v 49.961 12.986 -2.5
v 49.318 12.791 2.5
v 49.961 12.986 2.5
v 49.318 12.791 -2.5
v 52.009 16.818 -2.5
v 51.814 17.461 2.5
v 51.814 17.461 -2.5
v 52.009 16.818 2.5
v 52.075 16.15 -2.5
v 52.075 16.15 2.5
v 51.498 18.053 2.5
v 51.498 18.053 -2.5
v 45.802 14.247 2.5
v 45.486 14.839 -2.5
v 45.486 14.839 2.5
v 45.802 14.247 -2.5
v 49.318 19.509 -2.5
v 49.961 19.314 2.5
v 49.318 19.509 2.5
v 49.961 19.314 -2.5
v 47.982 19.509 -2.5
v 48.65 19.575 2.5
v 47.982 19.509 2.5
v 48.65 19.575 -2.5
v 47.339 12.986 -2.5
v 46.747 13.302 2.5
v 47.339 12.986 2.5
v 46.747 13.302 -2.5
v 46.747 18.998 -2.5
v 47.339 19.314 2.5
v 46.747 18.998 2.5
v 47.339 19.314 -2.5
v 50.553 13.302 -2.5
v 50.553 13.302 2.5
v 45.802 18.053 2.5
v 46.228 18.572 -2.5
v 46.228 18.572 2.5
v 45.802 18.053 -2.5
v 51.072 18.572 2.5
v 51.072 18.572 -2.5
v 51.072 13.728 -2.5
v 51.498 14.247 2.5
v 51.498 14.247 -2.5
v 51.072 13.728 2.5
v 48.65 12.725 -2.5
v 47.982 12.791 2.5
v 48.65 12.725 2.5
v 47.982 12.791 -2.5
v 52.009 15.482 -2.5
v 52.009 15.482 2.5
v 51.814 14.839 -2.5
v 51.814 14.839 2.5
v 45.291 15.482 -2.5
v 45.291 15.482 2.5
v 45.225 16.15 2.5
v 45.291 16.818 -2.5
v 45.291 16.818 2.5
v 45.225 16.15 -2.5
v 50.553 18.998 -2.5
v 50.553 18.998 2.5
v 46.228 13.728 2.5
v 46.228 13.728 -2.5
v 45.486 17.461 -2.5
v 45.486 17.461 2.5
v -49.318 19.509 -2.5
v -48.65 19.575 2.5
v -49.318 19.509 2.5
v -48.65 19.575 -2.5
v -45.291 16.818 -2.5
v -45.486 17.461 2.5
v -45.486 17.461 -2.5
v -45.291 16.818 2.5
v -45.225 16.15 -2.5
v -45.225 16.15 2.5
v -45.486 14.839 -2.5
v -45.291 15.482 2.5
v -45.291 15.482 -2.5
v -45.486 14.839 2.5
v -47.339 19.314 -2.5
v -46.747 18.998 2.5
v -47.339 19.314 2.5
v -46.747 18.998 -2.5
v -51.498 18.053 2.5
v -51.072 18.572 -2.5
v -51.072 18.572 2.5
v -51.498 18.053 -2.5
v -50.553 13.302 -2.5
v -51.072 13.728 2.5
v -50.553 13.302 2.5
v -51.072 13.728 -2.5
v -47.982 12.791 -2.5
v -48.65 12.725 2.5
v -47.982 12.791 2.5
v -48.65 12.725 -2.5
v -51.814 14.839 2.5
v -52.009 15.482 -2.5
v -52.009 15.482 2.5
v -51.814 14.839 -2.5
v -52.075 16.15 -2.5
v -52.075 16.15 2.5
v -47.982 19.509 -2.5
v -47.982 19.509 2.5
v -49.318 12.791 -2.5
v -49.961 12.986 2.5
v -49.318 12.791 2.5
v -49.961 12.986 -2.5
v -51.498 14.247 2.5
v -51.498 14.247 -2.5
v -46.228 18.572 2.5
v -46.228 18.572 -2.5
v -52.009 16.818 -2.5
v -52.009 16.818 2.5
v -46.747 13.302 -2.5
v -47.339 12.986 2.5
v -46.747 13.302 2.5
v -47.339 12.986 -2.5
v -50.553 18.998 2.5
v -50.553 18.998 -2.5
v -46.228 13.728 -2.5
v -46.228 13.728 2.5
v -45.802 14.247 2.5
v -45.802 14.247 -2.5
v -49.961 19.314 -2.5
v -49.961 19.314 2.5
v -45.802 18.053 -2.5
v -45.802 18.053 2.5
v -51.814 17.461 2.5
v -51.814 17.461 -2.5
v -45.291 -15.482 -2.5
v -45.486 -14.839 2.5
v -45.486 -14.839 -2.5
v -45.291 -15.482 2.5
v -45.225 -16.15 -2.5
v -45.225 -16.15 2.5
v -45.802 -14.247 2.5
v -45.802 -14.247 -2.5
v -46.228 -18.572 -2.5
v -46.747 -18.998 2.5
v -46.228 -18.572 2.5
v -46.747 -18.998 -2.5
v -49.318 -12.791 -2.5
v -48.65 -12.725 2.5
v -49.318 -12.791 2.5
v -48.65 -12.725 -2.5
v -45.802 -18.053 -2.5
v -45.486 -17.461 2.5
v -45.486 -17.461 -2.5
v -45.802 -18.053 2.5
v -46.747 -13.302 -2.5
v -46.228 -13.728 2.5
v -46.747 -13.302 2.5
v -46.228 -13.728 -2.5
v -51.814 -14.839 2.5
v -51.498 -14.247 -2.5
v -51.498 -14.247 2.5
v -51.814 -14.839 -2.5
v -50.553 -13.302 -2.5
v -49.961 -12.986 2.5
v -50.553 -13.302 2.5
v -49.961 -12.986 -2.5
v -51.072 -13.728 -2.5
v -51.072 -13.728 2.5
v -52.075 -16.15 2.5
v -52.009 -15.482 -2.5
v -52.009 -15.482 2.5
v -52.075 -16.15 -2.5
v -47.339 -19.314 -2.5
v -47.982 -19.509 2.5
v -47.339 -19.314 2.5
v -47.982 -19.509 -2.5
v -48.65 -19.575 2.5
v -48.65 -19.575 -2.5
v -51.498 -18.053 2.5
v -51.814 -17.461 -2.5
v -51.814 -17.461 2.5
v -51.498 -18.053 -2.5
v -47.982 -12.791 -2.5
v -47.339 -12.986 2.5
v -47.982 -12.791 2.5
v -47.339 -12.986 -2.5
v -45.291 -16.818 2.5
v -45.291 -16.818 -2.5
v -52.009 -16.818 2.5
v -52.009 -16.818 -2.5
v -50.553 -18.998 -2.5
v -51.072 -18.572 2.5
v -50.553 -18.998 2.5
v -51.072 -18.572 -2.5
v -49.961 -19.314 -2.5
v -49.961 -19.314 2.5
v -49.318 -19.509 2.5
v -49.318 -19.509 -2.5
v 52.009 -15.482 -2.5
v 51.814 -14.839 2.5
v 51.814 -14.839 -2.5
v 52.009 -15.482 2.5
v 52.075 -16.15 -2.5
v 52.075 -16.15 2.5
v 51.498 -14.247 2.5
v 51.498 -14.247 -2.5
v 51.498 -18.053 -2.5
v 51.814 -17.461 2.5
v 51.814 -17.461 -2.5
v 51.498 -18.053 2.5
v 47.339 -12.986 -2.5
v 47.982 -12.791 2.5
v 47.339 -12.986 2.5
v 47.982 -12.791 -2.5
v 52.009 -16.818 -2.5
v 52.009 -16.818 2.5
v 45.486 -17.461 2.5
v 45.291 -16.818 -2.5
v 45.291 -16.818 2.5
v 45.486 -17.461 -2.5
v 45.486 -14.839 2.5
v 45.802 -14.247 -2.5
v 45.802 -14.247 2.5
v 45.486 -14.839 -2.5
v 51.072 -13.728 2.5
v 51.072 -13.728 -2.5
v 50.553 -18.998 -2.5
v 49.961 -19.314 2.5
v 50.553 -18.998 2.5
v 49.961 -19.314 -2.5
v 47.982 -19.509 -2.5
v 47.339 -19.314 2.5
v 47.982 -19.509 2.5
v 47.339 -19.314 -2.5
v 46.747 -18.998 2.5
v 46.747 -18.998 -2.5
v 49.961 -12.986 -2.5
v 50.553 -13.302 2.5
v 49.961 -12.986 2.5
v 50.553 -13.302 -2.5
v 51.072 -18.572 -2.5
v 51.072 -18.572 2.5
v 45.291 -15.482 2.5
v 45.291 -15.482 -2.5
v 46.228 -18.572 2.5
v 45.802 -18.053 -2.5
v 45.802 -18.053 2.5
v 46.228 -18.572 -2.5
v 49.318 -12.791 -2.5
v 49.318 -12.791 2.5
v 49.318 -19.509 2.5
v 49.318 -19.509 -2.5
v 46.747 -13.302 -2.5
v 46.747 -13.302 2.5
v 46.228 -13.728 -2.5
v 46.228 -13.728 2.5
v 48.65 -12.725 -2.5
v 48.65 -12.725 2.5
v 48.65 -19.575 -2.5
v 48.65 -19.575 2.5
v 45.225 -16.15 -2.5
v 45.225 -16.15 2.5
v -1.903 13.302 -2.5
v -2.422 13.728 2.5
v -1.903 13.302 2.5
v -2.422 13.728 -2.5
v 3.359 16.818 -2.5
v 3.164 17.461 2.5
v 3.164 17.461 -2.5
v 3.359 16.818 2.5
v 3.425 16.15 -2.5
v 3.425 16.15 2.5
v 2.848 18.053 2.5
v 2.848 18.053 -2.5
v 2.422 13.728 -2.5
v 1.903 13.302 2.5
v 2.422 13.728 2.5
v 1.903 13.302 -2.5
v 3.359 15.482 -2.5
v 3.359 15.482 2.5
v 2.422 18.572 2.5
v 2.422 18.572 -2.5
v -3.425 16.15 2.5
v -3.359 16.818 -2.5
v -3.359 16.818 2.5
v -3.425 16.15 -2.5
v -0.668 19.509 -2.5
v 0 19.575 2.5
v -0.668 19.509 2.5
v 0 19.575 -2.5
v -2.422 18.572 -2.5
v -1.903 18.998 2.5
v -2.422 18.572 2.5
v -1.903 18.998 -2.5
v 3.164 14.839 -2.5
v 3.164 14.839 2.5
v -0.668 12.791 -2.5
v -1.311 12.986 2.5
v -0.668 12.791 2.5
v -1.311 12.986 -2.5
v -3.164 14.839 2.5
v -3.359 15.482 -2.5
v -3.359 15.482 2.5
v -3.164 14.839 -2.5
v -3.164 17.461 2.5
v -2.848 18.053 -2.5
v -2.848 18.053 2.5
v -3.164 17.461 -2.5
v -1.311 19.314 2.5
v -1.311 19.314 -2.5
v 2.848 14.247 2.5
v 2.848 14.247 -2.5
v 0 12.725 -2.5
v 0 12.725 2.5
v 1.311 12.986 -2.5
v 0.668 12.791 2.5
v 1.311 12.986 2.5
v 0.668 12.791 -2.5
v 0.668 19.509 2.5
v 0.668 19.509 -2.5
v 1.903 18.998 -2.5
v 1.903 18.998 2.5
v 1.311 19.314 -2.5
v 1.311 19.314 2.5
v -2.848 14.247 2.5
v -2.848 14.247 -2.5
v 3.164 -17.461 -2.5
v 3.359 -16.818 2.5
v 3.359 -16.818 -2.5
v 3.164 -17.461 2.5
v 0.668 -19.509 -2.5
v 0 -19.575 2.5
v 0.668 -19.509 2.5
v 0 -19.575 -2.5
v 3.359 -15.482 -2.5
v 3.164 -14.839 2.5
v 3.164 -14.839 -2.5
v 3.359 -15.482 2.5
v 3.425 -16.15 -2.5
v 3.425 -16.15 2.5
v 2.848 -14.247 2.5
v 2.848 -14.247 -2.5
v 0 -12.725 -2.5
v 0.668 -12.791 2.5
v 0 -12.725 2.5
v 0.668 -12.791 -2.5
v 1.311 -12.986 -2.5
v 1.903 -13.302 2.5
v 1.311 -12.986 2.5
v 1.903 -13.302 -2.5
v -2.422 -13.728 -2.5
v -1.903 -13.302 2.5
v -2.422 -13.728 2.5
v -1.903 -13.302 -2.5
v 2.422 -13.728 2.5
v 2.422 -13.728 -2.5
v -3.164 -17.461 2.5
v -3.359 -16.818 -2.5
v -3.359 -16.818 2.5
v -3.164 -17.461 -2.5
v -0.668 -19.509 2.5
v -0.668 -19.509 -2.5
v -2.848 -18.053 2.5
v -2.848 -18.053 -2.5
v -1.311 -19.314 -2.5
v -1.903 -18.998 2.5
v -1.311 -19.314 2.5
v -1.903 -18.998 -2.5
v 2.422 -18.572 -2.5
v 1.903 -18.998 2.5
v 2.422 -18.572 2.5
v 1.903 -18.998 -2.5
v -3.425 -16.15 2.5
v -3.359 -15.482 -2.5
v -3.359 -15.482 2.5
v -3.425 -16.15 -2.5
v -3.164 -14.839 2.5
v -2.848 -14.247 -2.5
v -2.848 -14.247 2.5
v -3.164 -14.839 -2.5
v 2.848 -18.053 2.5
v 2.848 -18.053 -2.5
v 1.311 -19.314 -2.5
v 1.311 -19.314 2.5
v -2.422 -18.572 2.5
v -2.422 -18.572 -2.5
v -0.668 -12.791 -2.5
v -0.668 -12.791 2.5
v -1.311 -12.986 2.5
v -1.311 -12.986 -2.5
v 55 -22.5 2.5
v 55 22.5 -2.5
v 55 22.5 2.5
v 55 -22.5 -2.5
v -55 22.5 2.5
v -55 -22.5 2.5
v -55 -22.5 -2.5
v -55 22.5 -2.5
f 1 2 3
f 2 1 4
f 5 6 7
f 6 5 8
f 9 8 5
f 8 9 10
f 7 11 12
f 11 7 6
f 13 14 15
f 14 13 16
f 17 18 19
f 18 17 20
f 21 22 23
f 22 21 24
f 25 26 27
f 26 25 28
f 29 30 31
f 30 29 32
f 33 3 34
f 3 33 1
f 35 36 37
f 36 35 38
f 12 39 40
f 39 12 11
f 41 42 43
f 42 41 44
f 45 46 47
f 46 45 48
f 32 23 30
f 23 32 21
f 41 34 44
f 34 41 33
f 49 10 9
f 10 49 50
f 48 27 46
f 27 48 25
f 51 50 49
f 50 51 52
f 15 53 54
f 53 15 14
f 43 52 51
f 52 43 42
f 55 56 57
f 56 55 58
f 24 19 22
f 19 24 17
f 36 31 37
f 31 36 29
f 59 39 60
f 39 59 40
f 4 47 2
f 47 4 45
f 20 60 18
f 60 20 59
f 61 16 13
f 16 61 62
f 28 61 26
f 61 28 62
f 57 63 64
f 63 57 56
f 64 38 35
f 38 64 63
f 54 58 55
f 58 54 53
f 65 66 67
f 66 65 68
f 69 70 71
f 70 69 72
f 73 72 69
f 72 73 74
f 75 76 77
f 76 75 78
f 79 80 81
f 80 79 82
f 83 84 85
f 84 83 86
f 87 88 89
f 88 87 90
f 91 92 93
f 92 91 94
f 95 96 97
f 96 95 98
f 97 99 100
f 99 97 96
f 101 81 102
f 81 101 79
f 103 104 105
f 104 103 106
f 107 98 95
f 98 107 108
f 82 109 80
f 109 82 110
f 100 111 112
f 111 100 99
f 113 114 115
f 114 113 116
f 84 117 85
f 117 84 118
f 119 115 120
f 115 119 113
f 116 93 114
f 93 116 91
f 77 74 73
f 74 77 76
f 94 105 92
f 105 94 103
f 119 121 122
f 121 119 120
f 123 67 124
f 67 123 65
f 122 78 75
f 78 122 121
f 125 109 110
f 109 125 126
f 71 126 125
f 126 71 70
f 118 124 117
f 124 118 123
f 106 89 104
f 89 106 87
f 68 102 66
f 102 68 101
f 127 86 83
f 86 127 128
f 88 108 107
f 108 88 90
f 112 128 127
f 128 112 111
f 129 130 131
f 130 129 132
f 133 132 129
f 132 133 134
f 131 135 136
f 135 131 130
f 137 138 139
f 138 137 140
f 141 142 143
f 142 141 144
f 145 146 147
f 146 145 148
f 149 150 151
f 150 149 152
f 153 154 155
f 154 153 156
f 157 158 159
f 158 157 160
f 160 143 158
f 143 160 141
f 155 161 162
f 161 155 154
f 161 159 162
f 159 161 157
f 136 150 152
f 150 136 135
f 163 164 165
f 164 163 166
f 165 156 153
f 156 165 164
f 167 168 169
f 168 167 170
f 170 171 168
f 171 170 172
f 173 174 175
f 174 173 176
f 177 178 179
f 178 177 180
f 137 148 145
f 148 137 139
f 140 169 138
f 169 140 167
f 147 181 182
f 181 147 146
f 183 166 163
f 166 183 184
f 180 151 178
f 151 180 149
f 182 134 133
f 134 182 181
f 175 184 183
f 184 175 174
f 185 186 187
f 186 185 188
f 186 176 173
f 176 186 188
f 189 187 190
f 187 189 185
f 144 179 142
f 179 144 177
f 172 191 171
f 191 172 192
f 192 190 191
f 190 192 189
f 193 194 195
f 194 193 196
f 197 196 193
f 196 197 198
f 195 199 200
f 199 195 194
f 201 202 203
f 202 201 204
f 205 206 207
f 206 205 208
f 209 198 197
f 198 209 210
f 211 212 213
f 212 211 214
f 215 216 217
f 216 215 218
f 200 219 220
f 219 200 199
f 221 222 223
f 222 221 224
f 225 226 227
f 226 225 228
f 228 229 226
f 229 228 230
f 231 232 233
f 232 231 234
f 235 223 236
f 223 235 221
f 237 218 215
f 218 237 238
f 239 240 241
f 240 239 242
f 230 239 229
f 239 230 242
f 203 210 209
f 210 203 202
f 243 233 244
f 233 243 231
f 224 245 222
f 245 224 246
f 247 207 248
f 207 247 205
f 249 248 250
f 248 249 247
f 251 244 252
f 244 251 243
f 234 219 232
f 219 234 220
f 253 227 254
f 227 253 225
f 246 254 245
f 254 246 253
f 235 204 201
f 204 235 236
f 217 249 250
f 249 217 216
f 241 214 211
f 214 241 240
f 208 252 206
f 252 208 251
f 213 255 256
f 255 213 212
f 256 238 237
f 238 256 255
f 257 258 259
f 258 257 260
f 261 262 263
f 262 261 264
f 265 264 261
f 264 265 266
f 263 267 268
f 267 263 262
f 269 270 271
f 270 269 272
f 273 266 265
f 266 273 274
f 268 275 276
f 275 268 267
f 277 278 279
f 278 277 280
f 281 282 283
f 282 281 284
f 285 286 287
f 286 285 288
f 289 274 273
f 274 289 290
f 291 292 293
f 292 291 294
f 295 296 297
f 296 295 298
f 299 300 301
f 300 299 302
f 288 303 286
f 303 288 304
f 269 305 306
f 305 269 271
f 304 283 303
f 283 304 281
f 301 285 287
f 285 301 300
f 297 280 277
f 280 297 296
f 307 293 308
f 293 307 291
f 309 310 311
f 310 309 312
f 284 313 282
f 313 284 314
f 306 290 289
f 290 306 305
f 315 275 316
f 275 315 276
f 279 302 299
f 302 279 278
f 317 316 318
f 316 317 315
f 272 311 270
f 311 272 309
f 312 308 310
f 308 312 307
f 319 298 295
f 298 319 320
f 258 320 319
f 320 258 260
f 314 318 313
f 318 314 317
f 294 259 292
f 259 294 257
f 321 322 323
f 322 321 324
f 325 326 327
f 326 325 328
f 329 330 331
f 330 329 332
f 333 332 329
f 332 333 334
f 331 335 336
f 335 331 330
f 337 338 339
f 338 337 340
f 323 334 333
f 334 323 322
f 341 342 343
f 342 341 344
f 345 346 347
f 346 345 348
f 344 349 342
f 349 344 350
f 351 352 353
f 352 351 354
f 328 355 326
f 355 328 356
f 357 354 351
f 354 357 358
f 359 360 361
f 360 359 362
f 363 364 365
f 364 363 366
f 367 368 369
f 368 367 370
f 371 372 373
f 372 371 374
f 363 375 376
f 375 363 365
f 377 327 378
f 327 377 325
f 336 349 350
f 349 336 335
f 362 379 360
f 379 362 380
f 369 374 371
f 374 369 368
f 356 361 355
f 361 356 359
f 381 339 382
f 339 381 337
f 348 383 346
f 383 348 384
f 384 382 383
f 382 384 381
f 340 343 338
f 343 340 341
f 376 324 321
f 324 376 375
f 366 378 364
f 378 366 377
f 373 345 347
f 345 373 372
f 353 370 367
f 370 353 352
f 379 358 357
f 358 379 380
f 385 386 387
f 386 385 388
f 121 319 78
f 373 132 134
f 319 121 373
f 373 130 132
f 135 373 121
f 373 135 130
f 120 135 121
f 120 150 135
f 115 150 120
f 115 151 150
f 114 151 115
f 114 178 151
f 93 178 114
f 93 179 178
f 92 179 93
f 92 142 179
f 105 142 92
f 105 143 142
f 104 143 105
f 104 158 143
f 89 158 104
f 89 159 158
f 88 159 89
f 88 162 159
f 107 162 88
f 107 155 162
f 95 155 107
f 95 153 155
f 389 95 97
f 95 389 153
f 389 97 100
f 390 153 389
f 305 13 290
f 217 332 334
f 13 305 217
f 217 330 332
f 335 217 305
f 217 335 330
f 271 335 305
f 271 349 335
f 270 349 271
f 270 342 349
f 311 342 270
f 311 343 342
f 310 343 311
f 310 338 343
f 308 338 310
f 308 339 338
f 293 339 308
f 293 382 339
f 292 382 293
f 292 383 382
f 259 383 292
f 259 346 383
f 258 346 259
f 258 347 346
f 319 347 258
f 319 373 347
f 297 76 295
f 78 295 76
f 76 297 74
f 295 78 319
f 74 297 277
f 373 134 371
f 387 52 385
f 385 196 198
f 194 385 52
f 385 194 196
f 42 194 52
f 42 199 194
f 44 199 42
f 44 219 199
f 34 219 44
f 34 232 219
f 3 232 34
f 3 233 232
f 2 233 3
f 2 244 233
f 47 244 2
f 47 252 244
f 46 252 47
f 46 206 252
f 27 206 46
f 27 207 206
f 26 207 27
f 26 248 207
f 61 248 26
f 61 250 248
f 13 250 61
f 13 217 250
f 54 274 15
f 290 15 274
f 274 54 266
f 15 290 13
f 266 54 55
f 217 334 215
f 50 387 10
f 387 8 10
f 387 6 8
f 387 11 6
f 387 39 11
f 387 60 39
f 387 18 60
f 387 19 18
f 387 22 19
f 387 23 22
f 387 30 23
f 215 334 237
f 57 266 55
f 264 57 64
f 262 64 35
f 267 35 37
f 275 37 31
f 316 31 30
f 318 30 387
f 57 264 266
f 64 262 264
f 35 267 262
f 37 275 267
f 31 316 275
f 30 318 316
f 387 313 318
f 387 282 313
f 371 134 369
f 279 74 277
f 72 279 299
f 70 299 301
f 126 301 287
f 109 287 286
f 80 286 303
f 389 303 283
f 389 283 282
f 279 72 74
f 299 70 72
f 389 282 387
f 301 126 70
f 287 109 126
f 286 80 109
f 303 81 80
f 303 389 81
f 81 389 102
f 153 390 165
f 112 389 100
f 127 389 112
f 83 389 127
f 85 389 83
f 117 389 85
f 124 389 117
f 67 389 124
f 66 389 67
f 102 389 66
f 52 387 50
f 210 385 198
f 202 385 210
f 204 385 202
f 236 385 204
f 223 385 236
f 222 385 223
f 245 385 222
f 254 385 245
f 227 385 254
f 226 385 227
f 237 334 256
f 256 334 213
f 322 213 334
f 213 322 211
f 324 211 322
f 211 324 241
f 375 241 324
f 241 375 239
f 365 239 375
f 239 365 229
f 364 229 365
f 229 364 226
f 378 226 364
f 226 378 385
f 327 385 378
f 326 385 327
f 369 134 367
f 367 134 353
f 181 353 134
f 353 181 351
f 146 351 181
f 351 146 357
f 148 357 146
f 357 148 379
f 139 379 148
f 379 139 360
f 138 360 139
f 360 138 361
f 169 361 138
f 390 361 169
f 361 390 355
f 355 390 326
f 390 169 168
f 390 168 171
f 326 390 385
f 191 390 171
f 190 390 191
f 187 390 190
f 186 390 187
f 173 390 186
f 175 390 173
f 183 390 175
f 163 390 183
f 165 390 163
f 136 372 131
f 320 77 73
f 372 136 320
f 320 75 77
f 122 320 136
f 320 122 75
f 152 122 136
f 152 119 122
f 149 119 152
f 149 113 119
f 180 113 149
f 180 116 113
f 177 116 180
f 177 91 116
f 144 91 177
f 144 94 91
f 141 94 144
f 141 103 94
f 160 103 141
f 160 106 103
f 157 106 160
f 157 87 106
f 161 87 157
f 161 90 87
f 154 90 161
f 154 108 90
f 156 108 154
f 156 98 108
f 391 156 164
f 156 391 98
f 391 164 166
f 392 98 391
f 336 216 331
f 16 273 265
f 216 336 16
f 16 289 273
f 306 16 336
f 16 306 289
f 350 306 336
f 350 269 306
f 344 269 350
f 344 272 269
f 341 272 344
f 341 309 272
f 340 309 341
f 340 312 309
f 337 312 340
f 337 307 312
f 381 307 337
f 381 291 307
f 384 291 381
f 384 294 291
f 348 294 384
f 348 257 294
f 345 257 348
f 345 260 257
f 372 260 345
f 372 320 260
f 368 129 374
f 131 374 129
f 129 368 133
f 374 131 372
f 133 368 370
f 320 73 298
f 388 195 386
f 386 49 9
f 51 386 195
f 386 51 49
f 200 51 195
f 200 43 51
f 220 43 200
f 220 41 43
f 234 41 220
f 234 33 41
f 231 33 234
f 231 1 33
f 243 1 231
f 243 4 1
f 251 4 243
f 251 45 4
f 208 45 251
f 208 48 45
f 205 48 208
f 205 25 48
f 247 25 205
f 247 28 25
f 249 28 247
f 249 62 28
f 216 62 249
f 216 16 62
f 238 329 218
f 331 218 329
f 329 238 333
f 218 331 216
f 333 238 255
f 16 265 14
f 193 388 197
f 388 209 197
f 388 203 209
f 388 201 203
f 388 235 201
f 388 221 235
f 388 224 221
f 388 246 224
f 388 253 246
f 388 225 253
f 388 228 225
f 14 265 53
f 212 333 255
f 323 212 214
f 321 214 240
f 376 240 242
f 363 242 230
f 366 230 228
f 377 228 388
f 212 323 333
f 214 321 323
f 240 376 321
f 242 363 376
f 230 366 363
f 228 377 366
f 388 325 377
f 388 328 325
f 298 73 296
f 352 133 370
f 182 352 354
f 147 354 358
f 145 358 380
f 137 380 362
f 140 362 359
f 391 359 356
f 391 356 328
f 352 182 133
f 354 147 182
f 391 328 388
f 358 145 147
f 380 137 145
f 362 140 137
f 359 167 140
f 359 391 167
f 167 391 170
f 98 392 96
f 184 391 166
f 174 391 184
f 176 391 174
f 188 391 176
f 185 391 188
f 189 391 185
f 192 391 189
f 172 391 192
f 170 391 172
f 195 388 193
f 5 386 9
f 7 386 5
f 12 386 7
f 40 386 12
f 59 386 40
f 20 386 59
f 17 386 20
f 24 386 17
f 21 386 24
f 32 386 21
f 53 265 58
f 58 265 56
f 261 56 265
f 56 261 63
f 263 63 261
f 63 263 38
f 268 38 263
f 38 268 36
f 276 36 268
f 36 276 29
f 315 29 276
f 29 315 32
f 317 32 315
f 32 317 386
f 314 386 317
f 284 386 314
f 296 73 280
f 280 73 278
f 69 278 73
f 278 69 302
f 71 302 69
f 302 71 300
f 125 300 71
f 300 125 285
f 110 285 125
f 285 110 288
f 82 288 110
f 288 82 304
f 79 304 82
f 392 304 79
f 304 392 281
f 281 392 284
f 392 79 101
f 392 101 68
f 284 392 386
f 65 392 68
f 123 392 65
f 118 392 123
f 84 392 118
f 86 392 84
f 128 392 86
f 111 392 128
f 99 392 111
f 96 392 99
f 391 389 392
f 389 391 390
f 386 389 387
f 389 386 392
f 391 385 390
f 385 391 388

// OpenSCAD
$fn = 32;

// ----------------------------------------------------------------------
// Corner plate 110 x 45 x 5
// 6 holes, centres taken from the edge offset
// ----------------------------------------------------------------------

// --- parameters (mm) ---
plate = [110, 45, 5];    // overall size (x, y, z)
holes = 6;               // number of holes the drawing asks for
bore_d = 6.6;            // nominal hole diameter from the drawing
print_allowance = 0.25;  // clearance added for printing
edge = 6.35;             // hole centre offset from the plate edge

// --- derived feature positions (mm) ---
hole_d = bore_d + print_allowance;  // = 6.85   hole diameter as printed
corner_x = plate[0] / 2 - edge;     // = 48.65   corner hole X
corner_y = plate[1] / 2 - edge;     // = 16.15   corner hole Y
feature_centers = [
  [corner_x, corner_y],
  [-corner_x, corner_y],
  [-corner_x, -corner_y],
  [corner_x, -corner_y],
  [0, corner_y],
  [0, -corner_y]
];   // hole centres the loop below drills

// plate outline, every hole drilled through with the same cutters
difference() {
  cube(plate, center = true);
  for (centre = feature_centers)
    translate([centre[0], centre[1], 0])
      cylinder(d = hole_d, h = plate[2] + 2, center = true);
}
